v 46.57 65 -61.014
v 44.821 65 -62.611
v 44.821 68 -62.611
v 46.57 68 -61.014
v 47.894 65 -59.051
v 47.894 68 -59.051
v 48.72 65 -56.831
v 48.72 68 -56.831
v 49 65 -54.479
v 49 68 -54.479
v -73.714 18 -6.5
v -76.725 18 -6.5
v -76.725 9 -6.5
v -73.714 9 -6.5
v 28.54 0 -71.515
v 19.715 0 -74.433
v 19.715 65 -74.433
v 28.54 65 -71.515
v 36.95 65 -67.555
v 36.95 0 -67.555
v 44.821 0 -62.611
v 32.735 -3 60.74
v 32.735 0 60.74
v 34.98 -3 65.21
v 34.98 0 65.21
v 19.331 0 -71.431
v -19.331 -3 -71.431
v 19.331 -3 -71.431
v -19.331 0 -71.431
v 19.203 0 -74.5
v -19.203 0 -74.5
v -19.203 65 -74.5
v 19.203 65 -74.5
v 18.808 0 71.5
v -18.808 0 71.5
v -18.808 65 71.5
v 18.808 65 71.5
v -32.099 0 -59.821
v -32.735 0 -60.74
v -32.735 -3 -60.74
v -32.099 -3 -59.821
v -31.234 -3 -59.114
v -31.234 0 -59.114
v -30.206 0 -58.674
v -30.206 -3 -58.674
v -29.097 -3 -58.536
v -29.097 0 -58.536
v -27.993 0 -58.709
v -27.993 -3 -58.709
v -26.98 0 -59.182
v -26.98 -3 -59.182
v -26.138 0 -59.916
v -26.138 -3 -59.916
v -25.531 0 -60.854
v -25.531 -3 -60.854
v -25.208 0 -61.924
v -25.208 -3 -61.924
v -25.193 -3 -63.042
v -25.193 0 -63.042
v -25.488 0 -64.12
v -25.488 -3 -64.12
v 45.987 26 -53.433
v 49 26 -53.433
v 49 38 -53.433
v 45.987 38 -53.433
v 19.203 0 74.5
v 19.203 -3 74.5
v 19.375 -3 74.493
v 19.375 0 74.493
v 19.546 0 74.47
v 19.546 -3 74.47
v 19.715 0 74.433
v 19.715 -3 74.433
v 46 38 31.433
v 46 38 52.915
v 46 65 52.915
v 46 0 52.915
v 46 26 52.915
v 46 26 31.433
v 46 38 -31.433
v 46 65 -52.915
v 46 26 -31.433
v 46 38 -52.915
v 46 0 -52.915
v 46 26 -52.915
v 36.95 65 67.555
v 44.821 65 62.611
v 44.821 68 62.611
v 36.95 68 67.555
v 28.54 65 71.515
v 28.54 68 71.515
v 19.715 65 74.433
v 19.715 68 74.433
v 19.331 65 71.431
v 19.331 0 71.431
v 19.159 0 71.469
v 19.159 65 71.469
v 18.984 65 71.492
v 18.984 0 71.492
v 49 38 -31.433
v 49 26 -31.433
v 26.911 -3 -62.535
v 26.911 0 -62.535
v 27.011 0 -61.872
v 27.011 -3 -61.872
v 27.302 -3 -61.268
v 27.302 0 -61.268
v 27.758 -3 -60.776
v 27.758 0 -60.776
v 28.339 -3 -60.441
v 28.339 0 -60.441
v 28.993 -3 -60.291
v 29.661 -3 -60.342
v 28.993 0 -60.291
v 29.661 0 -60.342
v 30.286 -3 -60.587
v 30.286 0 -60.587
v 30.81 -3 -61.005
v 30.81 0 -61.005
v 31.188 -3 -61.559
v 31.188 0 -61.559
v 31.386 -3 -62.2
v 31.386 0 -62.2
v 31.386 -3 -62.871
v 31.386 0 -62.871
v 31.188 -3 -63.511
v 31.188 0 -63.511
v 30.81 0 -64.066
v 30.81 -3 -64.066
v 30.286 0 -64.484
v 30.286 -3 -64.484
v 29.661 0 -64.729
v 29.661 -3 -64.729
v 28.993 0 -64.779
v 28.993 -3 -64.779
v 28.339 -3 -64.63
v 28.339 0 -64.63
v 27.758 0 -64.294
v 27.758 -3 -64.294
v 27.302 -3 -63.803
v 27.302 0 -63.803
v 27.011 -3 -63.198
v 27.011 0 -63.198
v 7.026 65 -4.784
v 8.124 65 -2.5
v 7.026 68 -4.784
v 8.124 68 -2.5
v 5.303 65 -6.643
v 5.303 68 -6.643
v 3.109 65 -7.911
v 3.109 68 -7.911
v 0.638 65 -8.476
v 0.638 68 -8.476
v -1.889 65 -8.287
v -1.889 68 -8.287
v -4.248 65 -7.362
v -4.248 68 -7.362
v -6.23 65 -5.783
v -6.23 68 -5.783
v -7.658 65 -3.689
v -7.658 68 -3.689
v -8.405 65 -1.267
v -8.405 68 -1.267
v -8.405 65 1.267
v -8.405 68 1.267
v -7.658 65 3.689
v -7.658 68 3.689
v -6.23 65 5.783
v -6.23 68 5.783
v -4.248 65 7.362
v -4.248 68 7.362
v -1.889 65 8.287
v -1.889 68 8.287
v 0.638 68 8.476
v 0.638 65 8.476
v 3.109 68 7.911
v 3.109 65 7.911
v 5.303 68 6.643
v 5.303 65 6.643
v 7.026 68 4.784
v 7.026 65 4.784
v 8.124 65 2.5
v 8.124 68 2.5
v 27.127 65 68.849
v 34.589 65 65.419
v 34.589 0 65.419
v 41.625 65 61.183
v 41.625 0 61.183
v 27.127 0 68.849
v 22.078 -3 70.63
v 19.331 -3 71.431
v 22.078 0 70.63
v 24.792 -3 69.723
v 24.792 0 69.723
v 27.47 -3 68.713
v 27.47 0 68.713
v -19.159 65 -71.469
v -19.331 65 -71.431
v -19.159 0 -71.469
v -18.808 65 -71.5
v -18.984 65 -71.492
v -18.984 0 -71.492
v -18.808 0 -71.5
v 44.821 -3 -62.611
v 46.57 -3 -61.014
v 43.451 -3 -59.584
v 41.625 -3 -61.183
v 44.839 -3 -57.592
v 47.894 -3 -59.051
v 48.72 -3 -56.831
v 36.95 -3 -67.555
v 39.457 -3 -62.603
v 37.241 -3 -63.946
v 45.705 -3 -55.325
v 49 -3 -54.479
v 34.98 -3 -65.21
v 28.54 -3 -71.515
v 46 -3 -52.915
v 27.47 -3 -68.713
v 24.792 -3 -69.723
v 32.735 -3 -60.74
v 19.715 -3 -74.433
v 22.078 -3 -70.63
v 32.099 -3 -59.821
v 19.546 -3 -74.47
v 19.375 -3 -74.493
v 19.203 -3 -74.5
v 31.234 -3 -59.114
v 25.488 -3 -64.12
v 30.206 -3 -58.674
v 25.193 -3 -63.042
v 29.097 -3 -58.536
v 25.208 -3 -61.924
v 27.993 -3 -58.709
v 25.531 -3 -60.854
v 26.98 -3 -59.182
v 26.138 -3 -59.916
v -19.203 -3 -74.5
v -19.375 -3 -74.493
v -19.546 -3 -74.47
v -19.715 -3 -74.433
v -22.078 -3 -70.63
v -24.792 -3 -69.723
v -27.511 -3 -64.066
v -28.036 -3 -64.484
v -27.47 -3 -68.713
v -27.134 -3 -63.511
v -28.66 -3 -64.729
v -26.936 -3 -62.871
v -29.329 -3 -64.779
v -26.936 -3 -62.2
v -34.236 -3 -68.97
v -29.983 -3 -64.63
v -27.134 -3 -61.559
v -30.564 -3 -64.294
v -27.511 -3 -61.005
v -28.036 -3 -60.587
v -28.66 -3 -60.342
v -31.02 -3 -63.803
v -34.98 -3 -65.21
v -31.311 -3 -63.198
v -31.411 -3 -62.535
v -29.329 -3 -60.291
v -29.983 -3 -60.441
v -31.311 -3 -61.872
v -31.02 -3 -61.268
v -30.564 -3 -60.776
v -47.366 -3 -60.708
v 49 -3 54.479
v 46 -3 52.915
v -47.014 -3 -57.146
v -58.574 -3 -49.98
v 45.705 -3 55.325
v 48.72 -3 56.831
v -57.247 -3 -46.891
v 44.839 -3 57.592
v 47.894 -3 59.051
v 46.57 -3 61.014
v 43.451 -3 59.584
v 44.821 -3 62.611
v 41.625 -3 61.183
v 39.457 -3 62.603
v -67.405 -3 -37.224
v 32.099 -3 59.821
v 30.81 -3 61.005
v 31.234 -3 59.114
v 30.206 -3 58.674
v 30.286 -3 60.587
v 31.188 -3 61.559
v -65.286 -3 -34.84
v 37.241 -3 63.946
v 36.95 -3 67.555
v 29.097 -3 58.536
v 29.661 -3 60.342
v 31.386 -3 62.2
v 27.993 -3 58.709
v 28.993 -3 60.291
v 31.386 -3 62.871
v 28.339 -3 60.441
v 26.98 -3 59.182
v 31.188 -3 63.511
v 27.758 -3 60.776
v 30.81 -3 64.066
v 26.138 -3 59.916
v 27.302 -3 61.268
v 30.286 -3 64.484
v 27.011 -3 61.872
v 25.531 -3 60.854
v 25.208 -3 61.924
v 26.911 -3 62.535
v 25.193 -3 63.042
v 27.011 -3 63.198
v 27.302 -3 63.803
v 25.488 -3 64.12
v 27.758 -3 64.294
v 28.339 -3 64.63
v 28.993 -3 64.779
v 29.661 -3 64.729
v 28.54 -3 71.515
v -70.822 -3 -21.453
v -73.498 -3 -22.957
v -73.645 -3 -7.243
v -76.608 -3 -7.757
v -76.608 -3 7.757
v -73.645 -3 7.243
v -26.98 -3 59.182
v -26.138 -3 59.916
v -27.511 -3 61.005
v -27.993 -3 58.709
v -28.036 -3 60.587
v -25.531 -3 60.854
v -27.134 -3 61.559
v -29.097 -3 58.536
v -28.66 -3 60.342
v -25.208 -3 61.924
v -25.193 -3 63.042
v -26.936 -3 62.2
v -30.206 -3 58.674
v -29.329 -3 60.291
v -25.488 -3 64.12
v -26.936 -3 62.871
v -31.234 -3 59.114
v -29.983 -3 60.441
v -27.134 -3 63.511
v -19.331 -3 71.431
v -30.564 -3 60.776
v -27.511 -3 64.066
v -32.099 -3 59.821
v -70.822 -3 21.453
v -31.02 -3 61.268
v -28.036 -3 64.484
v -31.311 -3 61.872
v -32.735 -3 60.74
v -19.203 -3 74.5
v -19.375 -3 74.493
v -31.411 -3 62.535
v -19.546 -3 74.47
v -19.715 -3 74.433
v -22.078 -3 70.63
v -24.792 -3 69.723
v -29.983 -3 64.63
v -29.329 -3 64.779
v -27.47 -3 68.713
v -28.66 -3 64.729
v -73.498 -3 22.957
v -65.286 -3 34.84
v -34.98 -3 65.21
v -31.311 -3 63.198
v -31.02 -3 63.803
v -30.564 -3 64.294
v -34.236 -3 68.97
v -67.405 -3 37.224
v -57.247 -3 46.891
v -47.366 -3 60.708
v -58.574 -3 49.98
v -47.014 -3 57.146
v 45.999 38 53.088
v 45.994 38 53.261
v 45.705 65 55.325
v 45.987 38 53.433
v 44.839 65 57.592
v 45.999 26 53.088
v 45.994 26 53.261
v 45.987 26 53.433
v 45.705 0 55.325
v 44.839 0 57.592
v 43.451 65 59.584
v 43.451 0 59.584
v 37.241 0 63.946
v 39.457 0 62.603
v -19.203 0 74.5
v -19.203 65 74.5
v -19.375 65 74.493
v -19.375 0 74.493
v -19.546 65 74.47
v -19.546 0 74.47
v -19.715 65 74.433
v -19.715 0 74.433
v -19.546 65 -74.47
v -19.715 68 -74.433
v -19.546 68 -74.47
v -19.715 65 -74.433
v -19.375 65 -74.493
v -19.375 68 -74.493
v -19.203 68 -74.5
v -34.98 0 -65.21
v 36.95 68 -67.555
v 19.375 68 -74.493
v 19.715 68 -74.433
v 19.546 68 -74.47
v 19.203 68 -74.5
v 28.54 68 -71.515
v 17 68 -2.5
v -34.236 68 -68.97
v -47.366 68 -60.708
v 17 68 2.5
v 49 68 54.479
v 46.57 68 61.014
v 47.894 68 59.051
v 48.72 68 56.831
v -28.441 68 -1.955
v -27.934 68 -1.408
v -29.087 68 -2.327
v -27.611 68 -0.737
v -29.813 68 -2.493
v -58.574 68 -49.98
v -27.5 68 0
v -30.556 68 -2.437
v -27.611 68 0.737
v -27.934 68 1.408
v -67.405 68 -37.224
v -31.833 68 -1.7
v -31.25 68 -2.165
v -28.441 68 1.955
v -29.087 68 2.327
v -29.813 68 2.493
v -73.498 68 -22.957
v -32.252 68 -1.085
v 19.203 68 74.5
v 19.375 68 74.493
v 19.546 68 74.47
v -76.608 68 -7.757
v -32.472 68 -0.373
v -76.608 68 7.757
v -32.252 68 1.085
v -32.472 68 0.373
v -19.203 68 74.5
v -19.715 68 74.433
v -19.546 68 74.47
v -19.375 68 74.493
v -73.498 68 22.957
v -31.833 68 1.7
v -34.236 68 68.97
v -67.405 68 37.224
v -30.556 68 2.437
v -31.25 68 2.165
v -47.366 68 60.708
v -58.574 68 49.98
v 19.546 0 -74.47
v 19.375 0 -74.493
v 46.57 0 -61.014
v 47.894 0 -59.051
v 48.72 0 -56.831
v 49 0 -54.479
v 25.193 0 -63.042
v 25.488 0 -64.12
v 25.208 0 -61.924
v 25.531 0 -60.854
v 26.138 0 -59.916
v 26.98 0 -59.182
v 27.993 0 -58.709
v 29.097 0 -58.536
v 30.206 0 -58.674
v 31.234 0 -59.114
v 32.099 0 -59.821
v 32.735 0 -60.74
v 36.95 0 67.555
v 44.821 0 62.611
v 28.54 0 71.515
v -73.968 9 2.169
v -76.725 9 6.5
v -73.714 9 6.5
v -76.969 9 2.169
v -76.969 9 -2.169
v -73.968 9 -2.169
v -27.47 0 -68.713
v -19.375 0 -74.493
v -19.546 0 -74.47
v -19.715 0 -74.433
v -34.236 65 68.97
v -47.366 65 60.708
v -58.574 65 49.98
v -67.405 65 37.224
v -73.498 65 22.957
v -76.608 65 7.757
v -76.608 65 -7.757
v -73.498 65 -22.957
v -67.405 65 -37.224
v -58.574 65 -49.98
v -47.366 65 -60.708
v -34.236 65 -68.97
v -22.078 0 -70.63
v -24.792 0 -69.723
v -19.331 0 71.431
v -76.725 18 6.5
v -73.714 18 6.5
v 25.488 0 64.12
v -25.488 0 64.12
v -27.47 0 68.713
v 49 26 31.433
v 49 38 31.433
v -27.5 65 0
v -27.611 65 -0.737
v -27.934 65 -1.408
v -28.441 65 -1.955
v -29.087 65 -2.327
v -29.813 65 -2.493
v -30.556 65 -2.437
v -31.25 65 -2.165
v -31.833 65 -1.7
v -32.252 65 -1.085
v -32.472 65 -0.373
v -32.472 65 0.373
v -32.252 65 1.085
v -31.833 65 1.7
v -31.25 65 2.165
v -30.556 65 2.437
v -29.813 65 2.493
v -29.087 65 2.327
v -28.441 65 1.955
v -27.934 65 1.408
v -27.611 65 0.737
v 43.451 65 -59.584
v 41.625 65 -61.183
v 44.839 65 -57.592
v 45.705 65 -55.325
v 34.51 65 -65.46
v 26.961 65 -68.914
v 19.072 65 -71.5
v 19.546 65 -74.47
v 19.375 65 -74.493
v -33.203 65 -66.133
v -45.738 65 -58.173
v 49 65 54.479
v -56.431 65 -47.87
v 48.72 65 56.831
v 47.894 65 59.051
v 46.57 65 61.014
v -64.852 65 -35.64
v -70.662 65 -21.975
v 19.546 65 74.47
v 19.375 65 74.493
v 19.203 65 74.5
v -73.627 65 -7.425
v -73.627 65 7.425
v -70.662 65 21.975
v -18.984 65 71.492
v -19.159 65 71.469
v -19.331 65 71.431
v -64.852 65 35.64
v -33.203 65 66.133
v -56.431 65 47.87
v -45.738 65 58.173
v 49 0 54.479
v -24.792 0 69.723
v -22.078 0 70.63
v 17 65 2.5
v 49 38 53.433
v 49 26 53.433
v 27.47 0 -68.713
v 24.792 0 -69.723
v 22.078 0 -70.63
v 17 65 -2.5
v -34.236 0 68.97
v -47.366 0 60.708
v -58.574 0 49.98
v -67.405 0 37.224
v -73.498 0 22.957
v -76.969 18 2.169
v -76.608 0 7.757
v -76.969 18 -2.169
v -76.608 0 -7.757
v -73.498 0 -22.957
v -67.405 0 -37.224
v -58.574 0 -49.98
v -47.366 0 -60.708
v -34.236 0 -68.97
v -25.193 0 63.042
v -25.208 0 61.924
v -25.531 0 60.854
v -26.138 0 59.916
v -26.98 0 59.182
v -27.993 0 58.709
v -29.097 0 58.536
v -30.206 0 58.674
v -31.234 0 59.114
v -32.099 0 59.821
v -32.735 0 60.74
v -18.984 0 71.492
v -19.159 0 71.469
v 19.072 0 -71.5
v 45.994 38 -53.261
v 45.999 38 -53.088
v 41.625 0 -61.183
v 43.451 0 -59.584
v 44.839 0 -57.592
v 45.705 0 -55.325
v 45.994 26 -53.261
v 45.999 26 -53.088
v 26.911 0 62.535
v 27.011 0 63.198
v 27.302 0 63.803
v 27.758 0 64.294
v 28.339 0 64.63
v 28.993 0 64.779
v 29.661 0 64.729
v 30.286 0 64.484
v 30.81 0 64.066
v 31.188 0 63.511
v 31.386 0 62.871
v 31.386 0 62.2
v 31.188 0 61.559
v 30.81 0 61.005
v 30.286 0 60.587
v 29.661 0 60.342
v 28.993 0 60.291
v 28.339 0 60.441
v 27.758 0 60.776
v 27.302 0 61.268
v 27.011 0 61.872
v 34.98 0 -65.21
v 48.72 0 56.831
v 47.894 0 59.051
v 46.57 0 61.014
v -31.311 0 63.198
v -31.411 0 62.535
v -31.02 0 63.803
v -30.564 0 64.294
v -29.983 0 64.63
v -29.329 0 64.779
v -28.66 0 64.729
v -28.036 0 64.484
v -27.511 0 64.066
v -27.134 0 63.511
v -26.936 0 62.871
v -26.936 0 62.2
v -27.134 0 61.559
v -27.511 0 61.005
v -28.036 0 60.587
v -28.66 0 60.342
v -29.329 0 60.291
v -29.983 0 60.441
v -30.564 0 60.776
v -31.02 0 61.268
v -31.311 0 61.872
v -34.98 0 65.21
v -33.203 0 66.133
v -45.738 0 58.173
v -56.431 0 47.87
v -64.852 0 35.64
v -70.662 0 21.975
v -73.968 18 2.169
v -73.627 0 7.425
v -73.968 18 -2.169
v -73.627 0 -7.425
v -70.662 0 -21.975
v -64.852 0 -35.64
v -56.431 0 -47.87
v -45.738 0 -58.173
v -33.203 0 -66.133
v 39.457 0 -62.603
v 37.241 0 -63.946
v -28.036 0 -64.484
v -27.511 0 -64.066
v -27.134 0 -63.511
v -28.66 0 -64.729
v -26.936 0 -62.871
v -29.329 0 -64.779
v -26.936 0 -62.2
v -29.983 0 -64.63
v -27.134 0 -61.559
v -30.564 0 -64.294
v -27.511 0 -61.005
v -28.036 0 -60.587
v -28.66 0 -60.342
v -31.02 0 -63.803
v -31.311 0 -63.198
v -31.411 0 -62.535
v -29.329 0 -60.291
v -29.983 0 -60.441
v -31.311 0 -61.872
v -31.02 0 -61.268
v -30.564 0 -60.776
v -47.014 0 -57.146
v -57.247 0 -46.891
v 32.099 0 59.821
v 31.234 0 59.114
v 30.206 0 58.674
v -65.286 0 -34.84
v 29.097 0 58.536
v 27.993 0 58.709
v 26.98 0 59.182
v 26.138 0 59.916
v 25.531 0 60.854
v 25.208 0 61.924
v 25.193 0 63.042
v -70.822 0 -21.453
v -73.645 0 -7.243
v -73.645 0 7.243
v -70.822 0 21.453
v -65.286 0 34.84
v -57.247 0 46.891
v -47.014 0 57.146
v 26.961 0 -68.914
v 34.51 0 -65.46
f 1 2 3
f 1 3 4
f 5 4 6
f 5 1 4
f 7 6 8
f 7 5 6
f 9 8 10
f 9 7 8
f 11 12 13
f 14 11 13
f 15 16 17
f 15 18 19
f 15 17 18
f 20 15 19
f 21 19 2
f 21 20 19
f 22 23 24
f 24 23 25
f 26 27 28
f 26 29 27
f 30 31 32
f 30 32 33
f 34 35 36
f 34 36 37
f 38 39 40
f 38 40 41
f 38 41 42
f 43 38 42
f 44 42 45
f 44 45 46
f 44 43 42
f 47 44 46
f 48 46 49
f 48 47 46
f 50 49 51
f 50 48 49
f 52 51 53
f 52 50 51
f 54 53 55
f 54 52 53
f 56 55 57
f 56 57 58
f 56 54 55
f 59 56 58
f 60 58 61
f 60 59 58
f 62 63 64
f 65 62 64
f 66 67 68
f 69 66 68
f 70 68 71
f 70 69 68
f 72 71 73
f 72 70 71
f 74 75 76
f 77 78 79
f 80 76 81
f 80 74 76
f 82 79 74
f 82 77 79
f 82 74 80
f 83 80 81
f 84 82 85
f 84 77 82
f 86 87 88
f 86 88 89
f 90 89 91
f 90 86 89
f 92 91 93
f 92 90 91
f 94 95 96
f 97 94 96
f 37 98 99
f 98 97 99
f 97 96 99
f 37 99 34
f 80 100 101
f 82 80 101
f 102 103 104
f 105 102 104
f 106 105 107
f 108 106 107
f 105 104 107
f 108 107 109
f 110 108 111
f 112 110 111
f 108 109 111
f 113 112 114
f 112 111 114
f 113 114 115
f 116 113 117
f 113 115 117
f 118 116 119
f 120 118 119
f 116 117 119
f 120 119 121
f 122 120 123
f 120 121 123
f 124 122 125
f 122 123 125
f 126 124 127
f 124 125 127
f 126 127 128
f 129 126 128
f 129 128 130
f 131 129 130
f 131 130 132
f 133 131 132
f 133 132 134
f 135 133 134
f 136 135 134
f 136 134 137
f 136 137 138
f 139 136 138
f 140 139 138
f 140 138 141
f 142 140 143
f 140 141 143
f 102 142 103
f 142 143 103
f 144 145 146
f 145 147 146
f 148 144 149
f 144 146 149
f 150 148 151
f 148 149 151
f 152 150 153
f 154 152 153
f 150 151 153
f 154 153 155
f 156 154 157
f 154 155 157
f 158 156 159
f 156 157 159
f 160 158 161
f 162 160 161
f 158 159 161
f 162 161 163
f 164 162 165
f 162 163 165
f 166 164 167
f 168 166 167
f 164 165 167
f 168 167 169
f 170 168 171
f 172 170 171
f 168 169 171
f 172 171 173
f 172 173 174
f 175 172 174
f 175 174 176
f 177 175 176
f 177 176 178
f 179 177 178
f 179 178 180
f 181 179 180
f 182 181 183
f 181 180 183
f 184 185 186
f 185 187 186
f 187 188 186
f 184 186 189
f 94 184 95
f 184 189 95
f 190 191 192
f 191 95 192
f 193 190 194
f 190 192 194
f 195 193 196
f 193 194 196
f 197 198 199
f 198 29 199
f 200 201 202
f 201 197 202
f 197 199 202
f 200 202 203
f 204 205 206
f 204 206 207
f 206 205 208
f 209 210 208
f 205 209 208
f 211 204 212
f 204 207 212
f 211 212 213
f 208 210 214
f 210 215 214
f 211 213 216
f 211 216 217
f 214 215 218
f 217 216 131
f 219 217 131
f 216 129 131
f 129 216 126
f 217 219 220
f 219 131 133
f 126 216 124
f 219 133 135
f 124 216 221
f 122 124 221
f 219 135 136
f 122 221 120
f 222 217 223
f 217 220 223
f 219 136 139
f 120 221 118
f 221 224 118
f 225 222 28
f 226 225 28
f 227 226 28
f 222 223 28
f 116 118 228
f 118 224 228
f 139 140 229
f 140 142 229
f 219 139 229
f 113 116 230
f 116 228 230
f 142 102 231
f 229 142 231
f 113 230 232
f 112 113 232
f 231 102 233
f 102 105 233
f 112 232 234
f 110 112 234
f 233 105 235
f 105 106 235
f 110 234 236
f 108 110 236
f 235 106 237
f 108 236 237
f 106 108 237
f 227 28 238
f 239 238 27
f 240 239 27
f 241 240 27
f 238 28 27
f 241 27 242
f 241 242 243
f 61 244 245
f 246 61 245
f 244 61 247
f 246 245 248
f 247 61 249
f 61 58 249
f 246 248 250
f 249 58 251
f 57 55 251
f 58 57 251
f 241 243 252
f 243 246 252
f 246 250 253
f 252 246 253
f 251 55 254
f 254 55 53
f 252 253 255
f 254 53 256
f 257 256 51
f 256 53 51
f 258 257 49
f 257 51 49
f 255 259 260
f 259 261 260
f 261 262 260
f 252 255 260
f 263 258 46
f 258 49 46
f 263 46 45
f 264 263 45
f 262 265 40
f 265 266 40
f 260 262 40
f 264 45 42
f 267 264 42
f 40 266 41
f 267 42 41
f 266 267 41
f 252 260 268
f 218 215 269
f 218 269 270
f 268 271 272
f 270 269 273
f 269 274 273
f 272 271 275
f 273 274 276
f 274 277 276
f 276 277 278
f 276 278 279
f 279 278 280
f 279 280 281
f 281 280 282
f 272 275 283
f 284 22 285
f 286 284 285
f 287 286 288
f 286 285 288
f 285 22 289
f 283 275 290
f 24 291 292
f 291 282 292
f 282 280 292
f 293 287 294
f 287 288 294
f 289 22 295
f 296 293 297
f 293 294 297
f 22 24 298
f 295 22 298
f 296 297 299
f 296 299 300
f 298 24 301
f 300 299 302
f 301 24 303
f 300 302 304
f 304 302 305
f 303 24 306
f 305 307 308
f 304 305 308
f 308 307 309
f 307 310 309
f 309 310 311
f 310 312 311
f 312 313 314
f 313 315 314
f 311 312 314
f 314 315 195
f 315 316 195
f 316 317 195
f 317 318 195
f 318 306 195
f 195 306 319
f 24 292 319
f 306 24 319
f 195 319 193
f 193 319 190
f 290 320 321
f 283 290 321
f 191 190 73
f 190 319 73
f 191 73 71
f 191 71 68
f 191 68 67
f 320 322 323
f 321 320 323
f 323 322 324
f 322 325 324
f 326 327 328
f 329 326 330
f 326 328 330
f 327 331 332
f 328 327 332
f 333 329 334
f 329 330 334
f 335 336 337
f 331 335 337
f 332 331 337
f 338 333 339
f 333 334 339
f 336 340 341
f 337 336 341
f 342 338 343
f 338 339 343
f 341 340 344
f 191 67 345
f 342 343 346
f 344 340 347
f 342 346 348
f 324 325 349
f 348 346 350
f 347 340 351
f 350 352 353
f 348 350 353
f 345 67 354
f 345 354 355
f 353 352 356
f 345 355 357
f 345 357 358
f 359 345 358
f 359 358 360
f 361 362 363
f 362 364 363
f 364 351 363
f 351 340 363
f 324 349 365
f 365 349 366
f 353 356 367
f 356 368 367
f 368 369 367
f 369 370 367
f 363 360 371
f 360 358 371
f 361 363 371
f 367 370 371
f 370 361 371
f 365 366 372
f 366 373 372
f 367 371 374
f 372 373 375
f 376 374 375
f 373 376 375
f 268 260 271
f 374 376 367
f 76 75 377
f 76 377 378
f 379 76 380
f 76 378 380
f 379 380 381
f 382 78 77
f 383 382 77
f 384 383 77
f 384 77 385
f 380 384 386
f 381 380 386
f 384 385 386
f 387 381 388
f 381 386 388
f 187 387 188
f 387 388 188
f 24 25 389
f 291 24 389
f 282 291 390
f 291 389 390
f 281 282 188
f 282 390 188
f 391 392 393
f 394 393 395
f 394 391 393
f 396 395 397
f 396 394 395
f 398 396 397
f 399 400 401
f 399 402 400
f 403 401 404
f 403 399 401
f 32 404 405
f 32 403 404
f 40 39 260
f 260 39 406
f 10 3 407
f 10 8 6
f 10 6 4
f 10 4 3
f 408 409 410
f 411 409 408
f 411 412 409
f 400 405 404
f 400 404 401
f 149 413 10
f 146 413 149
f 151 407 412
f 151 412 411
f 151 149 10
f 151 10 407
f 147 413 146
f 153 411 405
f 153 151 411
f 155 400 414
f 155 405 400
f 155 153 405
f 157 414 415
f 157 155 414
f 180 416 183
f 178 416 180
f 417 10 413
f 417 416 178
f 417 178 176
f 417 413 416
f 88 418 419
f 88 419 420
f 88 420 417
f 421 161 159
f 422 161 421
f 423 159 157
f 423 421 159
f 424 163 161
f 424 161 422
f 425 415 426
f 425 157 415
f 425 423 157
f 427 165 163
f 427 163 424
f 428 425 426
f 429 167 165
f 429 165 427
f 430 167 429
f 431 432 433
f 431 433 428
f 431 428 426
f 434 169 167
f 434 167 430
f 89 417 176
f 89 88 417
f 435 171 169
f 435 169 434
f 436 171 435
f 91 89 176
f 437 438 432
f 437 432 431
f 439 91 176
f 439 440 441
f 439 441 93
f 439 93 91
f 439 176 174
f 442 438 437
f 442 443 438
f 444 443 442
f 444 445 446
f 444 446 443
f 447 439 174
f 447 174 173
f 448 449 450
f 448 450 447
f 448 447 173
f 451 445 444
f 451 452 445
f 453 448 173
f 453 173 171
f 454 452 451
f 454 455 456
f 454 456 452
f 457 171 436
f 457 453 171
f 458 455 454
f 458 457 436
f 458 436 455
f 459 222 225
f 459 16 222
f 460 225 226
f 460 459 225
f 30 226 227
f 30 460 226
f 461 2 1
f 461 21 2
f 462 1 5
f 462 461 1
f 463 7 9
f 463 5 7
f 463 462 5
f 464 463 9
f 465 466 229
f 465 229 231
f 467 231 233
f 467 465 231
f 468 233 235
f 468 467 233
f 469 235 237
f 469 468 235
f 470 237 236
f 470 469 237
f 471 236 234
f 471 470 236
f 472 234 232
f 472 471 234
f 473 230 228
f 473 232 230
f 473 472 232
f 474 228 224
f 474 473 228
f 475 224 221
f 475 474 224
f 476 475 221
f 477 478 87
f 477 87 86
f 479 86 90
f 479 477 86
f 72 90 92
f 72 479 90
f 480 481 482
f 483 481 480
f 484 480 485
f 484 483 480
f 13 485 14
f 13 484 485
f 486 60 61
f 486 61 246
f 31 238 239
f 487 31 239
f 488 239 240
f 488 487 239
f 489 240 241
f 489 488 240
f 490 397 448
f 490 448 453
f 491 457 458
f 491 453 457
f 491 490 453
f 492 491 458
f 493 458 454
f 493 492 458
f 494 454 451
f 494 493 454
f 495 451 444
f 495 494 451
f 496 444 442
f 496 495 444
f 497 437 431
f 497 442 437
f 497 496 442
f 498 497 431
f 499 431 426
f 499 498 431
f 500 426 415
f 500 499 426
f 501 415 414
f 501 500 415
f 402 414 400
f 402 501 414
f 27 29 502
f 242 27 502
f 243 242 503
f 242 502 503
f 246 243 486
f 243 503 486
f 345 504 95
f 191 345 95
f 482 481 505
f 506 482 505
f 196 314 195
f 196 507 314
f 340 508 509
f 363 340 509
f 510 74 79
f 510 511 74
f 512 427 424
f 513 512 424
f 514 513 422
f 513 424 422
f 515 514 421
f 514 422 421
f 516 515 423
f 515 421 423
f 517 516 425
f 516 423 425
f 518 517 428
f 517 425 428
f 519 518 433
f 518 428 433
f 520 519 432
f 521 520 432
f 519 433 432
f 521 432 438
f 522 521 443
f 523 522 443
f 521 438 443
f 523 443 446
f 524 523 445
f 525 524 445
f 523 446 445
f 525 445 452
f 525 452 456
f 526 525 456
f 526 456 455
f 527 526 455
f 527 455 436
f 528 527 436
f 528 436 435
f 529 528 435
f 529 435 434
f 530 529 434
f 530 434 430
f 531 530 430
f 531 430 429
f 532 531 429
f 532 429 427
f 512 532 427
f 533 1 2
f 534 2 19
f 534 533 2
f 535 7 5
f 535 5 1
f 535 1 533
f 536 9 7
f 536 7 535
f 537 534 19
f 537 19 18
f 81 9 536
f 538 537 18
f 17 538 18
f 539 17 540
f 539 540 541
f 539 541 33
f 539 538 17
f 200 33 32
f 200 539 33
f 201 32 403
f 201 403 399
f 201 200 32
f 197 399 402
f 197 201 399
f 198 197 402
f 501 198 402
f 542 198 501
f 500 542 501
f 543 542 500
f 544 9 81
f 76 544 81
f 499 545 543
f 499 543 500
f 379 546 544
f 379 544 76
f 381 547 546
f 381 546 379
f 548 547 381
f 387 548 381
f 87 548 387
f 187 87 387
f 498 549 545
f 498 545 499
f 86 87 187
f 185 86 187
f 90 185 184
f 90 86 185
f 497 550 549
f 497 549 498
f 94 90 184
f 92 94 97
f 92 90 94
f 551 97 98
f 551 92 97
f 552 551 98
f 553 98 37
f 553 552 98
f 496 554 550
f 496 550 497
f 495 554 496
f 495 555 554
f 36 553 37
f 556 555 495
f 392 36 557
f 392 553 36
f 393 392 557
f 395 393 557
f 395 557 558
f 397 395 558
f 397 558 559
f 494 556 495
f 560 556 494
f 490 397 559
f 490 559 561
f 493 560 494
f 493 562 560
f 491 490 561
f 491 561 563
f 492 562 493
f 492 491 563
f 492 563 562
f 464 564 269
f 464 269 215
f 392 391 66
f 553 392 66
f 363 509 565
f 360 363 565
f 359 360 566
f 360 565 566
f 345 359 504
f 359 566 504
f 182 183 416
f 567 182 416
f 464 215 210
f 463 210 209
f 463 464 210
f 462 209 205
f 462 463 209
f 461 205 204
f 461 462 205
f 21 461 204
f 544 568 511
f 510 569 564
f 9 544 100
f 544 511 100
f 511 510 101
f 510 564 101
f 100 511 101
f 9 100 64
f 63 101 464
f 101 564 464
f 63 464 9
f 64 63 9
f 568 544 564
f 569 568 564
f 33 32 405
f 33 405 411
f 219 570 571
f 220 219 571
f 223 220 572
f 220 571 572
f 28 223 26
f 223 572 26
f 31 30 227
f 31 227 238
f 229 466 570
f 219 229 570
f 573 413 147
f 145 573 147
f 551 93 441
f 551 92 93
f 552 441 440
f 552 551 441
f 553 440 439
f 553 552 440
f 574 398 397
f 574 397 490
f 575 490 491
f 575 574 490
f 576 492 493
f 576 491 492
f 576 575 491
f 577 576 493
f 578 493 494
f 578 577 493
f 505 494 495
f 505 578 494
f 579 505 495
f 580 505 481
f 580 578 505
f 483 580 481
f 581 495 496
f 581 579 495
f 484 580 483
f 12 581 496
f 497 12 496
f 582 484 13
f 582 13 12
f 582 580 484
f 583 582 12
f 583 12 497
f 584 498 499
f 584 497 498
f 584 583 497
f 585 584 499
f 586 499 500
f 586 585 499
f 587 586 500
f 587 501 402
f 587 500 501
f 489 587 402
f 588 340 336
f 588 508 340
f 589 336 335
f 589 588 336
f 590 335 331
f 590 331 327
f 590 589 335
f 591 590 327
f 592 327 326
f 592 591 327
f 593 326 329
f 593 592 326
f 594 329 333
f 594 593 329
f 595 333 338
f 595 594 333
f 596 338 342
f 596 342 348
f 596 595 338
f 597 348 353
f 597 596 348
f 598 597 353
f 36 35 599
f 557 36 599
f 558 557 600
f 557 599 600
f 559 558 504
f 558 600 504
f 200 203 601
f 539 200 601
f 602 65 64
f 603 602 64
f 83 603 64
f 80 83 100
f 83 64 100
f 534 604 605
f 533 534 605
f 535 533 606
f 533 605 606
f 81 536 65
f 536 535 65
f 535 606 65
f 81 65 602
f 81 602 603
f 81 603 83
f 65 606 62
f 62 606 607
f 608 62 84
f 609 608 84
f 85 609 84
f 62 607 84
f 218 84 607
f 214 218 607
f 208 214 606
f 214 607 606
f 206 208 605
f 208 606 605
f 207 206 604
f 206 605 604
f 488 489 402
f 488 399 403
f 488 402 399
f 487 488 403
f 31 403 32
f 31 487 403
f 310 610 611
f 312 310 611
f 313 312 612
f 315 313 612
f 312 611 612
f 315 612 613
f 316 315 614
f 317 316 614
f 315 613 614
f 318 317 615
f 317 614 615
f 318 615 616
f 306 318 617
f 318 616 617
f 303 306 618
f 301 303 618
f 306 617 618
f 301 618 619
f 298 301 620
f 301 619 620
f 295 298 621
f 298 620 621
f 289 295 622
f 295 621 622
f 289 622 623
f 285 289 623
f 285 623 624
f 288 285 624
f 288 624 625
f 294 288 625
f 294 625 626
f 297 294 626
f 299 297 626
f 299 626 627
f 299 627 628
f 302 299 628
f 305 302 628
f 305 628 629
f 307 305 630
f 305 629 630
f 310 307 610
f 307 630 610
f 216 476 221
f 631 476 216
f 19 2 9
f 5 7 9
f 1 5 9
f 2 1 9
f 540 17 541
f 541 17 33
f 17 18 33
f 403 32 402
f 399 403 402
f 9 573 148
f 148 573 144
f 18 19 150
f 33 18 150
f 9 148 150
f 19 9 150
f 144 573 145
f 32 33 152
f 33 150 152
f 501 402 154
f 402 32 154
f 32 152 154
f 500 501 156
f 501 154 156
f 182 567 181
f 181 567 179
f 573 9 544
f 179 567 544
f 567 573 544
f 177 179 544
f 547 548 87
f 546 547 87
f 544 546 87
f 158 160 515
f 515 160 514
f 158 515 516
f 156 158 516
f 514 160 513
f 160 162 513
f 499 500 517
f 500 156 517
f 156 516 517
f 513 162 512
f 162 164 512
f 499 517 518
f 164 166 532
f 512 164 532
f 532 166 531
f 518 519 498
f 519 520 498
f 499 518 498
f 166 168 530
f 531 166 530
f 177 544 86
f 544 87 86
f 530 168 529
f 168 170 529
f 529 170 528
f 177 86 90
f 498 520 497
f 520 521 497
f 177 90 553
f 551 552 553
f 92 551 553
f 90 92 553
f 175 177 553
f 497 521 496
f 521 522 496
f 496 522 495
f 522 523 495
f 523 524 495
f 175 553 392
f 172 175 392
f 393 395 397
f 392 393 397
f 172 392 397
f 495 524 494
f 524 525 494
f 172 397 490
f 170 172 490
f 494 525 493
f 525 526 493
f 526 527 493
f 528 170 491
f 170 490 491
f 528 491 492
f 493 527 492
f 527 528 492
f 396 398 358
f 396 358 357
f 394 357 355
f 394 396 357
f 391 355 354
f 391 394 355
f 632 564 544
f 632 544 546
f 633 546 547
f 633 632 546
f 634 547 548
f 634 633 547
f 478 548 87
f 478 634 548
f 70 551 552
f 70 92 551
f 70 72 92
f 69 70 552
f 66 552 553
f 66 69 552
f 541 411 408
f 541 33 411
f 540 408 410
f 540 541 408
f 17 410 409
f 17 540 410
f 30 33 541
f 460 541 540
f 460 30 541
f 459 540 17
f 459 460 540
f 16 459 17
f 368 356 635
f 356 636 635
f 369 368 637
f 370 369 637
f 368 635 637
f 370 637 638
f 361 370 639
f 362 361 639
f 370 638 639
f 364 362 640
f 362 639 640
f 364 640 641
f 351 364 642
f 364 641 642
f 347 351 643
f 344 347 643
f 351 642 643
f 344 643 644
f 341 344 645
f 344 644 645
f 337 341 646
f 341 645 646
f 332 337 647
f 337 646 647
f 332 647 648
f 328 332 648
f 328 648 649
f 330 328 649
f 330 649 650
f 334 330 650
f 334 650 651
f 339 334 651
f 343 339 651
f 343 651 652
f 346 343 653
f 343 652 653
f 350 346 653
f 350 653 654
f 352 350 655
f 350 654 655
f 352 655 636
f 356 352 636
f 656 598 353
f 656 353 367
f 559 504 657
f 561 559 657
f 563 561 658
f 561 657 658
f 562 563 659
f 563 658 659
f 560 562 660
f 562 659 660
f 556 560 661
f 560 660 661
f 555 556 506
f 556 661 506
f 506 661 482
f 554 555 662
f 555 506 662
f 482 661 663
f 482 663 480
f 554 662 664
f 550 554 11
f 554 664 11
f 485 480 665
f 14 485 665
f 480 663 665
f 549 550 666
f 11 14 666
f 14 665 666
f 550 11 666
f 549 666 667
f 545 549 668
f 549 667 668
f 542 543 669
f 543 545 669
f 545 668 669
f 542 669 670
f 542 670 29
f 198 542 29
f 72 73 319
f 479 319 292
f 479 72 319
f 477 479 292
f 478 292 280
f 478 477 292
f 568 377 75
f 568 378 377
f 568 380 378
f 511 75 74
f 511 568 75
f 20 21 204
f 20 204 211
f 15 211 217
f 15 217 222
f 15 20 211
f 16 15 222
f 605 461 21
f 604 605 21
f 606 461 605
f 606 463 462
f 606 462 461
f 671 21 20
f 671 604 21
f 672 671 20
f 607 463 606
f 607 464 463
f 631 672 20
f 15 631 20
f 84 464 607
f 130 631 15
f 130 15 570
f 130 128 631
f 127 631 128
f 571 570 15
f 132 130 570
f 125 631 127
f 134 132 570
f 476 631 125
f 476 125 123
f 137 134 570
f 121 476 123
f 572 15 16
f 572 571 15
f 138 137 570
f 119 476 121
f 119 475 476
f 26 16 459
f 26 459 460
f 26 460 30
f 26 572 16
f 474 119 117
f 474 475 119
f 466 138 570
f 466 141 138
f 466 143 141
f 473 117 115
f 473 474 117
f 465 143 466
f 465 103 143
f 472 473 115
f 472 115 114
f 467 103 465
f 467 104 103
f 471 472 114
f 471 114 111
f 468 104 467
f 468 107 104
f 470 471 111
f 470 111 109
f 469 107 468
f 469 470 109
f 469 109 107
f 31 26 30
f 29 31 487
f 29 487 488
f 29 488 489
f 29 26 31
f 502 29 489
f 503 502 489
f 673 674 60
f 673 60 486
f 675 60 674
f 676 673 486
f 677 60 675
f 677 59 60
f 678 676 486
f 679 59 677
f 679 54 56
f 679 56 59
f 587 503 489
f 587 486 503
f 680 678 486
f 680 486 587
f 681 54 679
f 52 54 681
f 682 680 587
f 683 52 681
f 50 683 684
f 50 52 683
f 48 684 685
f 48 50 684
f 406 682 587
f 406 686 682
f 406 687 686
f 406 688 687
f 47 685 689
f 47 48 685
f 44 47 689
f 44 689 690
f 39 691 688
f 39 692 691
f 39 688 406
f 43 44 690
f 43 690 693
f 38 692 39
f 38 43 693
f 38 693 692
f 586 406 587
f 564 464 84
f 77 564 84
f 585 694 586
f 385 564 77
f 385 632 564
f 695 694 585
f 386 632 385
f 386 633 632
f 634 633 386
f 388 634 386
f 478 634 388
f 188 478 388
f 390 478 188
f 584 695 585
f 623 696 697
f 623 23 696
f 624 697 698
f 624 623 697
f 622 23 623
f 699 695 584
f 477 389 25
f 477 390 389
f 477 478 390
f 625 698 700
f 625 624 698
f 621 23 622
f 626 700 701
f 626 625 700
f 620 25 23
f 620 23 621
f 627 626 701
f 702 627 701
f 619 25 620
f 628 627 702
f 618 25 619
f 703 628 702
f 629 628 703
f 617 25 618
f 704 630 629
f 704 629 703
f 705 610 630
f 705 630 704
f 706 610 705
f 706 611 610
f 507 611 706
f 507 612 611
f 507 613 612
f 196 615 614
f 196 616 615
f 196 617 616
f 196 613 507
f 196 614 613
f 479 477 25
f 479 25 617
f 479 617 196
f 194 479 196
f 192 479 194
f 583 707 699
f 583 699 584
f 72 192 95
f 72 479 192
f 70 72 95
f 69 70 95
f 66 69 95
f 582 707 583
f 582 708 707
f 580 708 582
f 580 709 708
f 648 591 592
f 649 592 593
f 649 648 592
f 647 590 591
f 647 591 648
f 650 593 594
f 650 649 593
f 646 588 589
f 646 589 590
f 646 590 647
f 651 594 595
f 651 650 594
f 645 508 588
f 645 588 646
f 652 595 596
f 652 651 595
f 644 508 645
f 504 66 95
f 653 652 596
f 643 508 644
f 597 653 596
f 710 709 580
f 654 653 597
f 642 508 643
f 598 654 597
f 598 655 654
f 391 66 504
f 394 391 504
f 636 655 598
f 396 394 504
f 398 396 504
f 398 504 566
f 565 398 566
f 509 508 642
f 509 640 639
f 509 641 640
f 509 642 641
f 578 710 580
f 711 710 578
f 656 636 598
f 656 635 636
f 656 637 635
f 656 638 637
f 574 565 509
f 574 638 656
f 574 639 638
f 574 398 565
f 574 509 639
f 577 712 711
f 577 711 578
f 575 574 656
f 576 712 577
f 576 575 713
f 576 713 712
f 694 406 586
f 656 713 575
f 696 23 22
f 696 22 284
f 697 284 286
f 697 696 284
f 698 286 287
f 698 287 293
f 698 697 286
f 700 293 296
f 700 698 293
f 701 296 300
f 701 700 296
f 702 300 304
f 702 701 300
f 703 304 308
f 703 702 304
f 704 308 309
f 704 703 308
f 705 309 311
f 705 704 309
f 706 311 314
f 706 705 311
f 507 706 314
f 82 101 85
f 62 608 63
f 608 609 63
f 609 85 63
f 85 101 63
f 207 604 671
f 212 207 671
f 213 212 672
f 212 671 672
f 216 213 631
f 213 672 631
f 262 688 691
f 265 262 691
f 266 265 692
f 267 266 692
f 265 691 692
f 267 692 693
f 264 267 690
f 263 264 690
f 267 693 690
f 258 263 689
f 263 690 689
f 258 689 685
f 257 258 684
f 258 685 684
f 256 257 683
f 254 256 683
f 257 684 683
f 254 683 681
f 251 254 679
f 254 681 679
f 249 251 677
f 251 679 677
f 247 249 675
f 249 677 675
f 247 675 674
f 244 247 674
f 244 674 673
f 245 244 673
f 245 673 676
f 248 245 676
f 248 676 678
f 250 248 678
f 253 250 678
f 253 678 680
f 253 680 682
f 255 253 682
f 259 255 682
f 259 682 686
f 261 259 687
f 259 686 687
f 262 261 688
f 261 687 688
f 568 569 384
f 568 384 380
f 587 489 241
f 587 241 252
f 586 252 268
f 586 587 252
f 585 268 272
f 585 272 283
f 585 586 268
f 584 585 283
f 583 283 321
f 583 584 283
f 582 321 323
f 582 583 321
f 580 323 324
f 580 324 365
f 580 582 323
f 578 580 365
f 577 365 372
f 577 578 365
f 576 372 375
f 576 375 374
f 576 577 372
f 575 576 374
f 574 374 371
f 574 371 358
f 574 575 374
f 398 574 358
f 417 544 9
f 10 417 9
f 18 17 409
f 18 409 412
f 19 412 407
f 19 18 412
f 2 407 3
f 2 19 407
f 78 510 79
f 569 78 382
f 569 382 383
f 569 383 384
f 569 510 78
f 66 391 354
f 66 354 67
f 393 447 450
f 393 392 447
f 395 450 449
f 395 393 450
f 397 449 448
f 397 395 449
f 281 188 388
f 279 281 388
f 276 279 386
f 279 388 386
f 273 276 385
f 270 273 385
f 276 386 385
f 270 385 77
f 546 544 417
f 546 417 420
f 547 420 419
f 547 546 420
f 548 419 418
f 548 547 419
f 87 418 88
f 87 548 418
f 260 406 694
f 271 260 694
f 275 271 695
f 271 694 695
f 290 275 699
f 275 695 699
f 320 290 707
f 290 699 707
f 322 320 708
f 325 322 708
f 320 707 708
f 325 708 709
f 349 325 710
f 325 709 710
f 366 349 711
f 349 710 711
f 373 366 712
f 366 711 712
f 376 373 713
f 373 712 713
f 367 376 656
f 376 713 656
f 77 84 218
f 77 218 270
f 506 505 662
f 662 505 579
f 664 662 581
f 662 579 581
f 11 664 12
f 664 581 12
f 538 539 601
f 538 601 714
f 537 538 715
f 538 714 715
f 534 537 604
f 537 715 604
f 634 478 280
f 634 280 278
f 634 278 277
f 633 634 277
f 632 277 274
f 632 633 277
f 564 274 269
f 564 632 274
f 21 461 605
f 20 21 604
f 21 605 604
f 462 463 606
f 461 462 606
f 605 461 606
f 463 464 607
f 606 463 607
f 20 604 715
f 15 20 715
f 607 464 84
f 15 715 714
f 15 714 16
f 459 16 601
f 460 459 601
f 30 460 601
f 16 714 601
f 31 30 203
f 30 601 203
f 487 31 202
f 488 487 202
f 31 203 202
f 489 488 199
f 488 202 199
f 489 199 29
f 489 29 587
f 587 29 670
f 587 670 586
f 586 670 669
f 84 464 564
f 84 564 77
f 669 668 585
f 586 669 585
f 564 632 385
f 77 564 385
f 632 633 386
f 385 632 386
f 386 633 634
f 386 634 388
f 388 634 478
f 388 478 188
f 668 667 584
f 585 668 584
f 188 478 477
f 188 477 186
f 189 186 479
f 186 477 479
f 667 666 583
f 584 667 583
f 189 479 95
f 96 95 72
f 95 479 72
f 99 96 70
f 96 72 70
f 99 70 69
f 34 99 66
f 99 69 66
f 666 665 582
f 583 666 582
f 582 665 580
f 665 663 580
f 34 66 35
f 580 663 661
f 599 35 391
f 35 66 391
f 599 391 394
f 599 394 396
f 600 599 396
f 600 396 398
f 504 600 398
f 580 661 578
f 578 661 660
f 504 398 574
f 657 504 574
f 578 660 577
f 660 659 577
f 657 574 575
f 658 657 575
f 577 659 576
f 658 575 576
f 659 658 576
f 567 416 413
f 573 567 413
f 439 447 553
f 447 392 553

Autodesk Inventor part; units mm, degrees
ref_plane "YZ Plane" through (0, 0, 0) normal (1, 0, 0) x (0, 1, 0)
ref_plane "XZ Plane" through (0, 0, 0) normal (0, 1, 0) x (-1, 0, 0)
sketch "Sketch1" plane through (0, 0, 0) normal (0, 1, 0) x (-1, 0, 0)
  line L0 (18.8082, 71.5) -> (-18.8082, 71.5)
  line L1 (0, 0) -> (-49, 0) construction
  line L2 (19.2029, 74.5) -> (-19.2029, 74.5)
  line L3 (18.8082, -71.5) -> (-19.0722, -71.5)
  line L4 (19.2029, -74.5) -> (-19.2029, -74.5)
  line L5 (0, 0) -> (0, 74.5) construction
  line L6 (-46, 52.915) -> (-46, -52.915)
  line L7 (-49, 54.4794) -> (-49, -54.4794)
  arc A0 (-41.625, -61.183) -> (-19.0722, -71.5) centre (0, 0) ccw
  arc A1 (-44.8209, -62.6106) -> (-19.7149, -74.4333) centre (0, 0) ccw
  arc A2 (19.7149, -74.4333) -> (19.7149, 74.4333) centre (0, 0) ccw
  arc A3 (-19.7149, 74.4333) -> (-44.8209, 62.6106) centre (0, 0) ccw
  arc A4 (19.3307, -71.4306) -> (19.3307, 71.4306) centre (0, 0) ccw
  arc A5 (-19.3307, 71.4306) -> (-41.625, 61.183) centre (0, 0) ccw
  arc A6 (-19.7149, -74.4333) -> (-19.2029, -74.5) centre (-19.2029, -72.5) ccw
  arc A7 (19.2029, -74.5) -> (19.7149, -74.4333) centre (19.2029, -72.5) ccw
  arc A8 (18.8082, -71.5) -> (19.3307, -71.4306) centre (18.8082, -69.5) ccw
  arc A9 (19.3307, 71.4306) -> (18.8082, 71.5) centre (18.8082, 69.5) ccw
  arc A10 (19.7149, 74.4333) -> (19.2029, 74.5) centre (19.2029, 72.5) ccw
  arc A11 (-18.8082, 71.5) -> (-19.3307, 71.4306) centre (-18.8082, 69.5) ccw
  arc A12 (-19.2029, 74.5) -> (-19.7149, 74.4333) centre (-19.2029, 72.5) ccw
  arc A13 (-41.625, 61.183) -> (-46, 52.915) centre (-36, 52.915) ccw
  arc A14 (-44.8209, 62.6106) -> (-49, 54.4794) centre (-39, 54.4794) ccw
  arc A15 (-49, -54.4794) -> (-44.8209, -62.6106) centre (-39, -54.4794) ccw
  arc A16 (-46, -52.915) -> (-41.625, -61.183) centre (-36, -52.915) ccw
  point P0 (-19.4615, 74.5)
  point P1 (19.0722, -71.5)
  point P2 (19.4615, -74.5)
  point P3 (-19.4615, -74.5)
  point P4 (-49, -59.397)
  point P5 (-46, 57.9655)
  point P6 (-46, -57.9655)
  point P7 (-49, 59.397)
  point P8 (19.4615, 74.5)
  point P9 (19.0722, 71.5)
  point P10 (-19.0722, 71.5)
  dimension "d2" = 71.5
  dimension "d4" = 3
  dimension "d6" = 46
  dimension "d7" = 3
  dimension "d8" = 2
  dimension "d9" = 10
  dimension "d10" = 74
  dimension "d11" = 77
  dimension "d12" = 74
  dimension "d13" = 77
extrude "Extrusion1" add sketch "Sketch1" along normal blind 65
sketch "Sketch2" plane through (49, 0, 54.4794) normal (1, 0, 0) x (0, 0, -1)
  line L0 (54.4794, 0) -> (54.4794, 65) construction
  line L1 (107.3944, 65) -> (1.5643, 65) projected
  line L2 (1.046, 38) -> (23.046, 38)
  line L3 (23.046, 38) -> (23.046, 26)
  line L4 (23.046, 26) -> (1.046, 26)
  line L5 (0, 0) -> (108.9587, 0) projected
  line L6 (-19.954, 0) -> (-19.954, 65) projected
  line L7 (23.046, 26) -> (1.046, 26)
  line L8 (1.046, 26) -> (1.046, 38)
  line L9 (107.9127, 38) -> (85.9127, 38)
  line L10 (85.9127, 38) -> (85.9127, 26)
  line L11 (85.9127, 26) -> (107.9127, 26)
  line L12 (107.9127, 26) -> (107.9127, 38)
  point P0 (1.046, 32)
  dimension "d16" = 26
  dimension "d235" = 22
  dimension "d236" = 12
  dimension "d237" = 21
extrude "Extrusion2" cut sketch "Sketch2" against normal blind 13.25
sketch "Sketch3" plane through (49, 0, 54.4794) normal (1, 0, 0) x (0, 0, -1)
  line L0 (3.568, 49.2223) -> (17.7975, 43.9952) construction
  line L1 (2.8909, 47.379) -> (17.1204, 42.1519)
  line L2 (18.4746, 45.8385) -> (4.2452, 51.0656)
  arc A0 (4.2452, 51.0656) -> (2.8909, 47.379) centre (3.568, 49.2223) ccw
  arc A1 (17.1204, 42.1519) -> (18.4746, 45.8385) centre (17.7975, 43.9952) ccw
  arc A2 (44.4296, 11.624) -> (34.6921, 2.9774) centre (43.8866, 2.4292) ccw construction
  arc A3 (44.531, 13.3402) -> (32.9759, 3.0797) centre (43.8866, 2.4292) ccw
  arc A4 (44.3283, 9.9077) -> (36.4083, 2.8751) centre (43.8866, 2.4292) ccw
  arc A5 (44.3283, 9.9077) -> (44.531, 13.3402) centre (44.4296, 11.624) ccw
  arc A6 (32.9759, 3.0797) -> (36.4083, 2.8751) centre (34.6921, 2.9774) ccw
  line L3 (54.4794, 0) -> (54.4794, 65) construction
  line L4 (106.0678, 47.379) -> (91.8383, 42.1519)
  line L5 (90.4841, 45.8385) -> (104.7135, 51.0656)
  arc A7 (106.0678, 47.379) -> (104.7135, 51.0656) centre (105.3907, 49.2223) ccw
  arc A8 (90.4841, 45.8385) -> (91.8383, 42.1519) centre (91.1612, 43.9952) ccw
  point P0 (10.6828, 46.6088)
extrude "Extrusion3" [suppressed]
extrude "Extrusion4" add sketch "Sketch1" along normal blind 3 from surface at 65 separate body contours A9 A4 A8 L3 A0 A16 L6 A13 A5 A11 L0 | A10 A2 A7 L4 A6 A1 A15 L7 A14 A3 A12 L2
sketch "Sketch5" plane through (-19.2029, 68, 74.5) normal (0, 1, 0) x (1, 0, 0)
  circle A0 centre (19.2029, 74.5) radius 8.5
  circle A1 centre (-10.7971, 74.5) radius 2.5
  line L0 (27.3269, 72) -> (36.2029, 72)
  line L1 (36.2029, 72) -> (36.2029, 77)
  line L2 (36.2029, 77) -> (27.3269, 77)
  line L3 (36.2029, 74.5) -> (68.2029, 74.5)
  line L4 (68.2029, 20.0206) -> (68.2029, 128.9794) projected
  line L5 (-10.7971, 74.5) -> (-57.7971, 74.5)
  arc A2 (-0.5121, 148.9333) -> (-0.5121, 0.0667) centre (19.2029, 74.5) ccw projected
  dimension "d26" = 17
  dimension "d27" = 5
  dimension "d31" = 5
  dimension "d32" = 17
  dimension "d47" = 30
  dimension "d204" = 32
  dimension "d205" = 47
  dimension "d206" = 49
extrude "Extrusion5" cut sketch "Sketch5" against normal through all
sketch "Sketch6" plane through (0, 0, 0) normal (0, 1, 0) x (-1, 0, 0)
  circle A0 centre (0, 0) radius 69 construction
  arc A1 (-19.3307, 71.4306) -> (-41.625, 61.183) centre (0, 0) ccw projected
  arc A2 (-41.625, 61.183) -> (-46, 52.915) centre (-36, 52.915) ccw projected
  line L0 (-46, -52.915) -> (-46, 52.915) projected
  arc A3 (-46, -52.915) -> (-41.625, -61.183) centre (-36, -52.915) ccw projected
  arc A4 (-41.625, -61.183) -> (-19.0722, -71.5) centre (0, 0) ccw projected
  line L1 (18.8082, -71.5) -> (-19.0722, -71.5) construction
  arc A5 (19.3307, -71.4306) -> (19.3307, 71.4306) centre (0, 0) ccw projected
  line L2 (-18.8082, 71.5) -> (18.8082, 71.5) construction
  line L3 (19.2029, 74.5) -> (-19.2029, 74.5) projected
  arc A6 (-19.7149, 74.4333) -> (-44.8209, 62.6106) centre (0, 0) ccw projected
  arc A7 (-44.8209, 62.6106) -> (-49, 54.4794) centre (-39, 54.4794) ccw projected
  line L4 (-49, 54.4794) -> (-49, -54.4794) projected
  arc A8 (-49, -54.4794) -> (-44.8209, -62.6106) centre (-39, -54.4794) ccw projected
  arc A9 (-44.8209, -62.6106) -> (-19.7149, -74.4333) centre (0, 0) ccw projected
  line L5 (-19.2029, -74.5) -> (19.2029, -74.5) projected
  arc A10 (19.7149, -74.4333) -> (19.7149, 74.4333) centre (0, 0) ccw projected
  arc A11 (-18.5383, 65.4242) -> (-38.25, 56.2222) centre (0, 0) ccw construction
  arc A12 (-38.25, 56.2222) -> (-40, 52.915) centre (-36, 52.915) ccw construction
  line L6 (-40, 52.915) -> (-40, -52.915) construction
  arc A13 (-40, -52.915) -> (-38.25, -56.2222) centre (-36, -52.915) ccw construction
  arc A14 (-38.25, -56.2222) -> (-18.5383, -65.4242) centre (0, 0) ccw construction
  line L7 (-17.9931, -65.5) -> (17.9931, -65.5) construction
  line L8 (-17.9931, 65.5) -> (17.9931, 65.5) construction
  arc A15 (18.5383, -65.4242) -> (18.5383, 65.4242) centre (0, 0) ccw construction
  arc A16 (-8.124, -2.5) -> (-8.124, 2.5) centre (0, 0) ccw projected
  line L9 (0, 0) -> (52.8571, 44.3523) construction
  line L10 (0, 0) -> (77, 0) construction
  line L11 (0, 0) -> (0, -69) construction
  circle A17 centre (29.1607, 62.5352) radius 3 construction
  line L12 (29.1607, 62.5352) -> (0, 0) construction
  circle A18 centre (-29.1607, 62.5352) radius 3 construction
  line L13 (-29.1607, 62.5352) -> (0, 0) construction
  arc A19 (-17.9931, 65.5) -> (-18.5383, 65.4242) centre (-17.9931, 63.5) ccw construction
  arc A20 (-18.5383, -65.4242) -> (-17.9931, -65.5) centre (-17.9931, -63.5) ccw construction
  arc A21 (17.9931, -65.5) -> (18.5383, -65.4242) centre (17.9931, -63.5) ccw construction
  arc A22 (18.5383, 65.4242) -> (17.9931, 65.5) centre (17.9931, 63.5) ccw construction
  arc A23 (-19.7149, -74.4333) -> (-19.2029, -74.5) centre (-19.2029, -72.5) ccw projected
  arc A24 (19.2029, -74.5) -> (19.7149, -74.4333) centre (19.2029, -72.5) ccw projected
  arc A25 (19.7149, 74.4333) -> (19.2029, 74.5) centre (19.2029, 72.5) ccw projected
  arc A26 (-19.2029, 74.5) -> (-19.7149, 74.4333) centre (-19.2029, 72.5) ccw projected
  circle A27 centre (29.1607, -62.5352) radius 3 construction
  circle A28 centre (-29.1607, -62.5352) radius 3 construction
  line L14 (19.3307, 65.1945) -> (19.3307, 71.4306)
  line L15 (-19.3307, 65.1945) -> (-19.3307, 71.4306)
  line L16 (19.3307, 71.4306) -> (-19.3307, 71.4306)
  line L17 (19.3307, -65.1945) -> (19.3307, -71.4306)
  line L18 (-19.3307, -65.1945) -> (-19.3307, -71.4306)
  line L19 (19.3307, -71.4306) -> (-19.3307, -71.4306)
  circle A29 centre (29.1607, 62.5352) radius 4
  circle A30 centre (-29.1607, 62.5352) radius 4
  line L20 (-32.7354, 60.7404) -> (-34.9798, 65.2105)
  circle A31 centre (29.1607, -62.5352) radius 4
  circle A32 centre (-29.1607, -62.5352) radius 4
  line L21 (-32.7354, -60.7404) -> (-34.9798, -65.2105)
  line L22 (32.7354, 60.7404) -> (34.9798, 65.2105)
  line L23 (32.7354, -60.7404) -> (34.9798, -65.2105)
  line L24 (-25.488, 64.1199) -> (-27.4696, 68.7126)
  line L25 (25.488, 64.1199) -> (27.4696, 68.7126)
  line L26 (-25.488, -64.1199) -> (-27.4696, -68.7126)
  line L27 (25.488, -64.1199) -> (27.4696, -68.7126)
  line L28 (-18.8082, 71.5) -> (-49, 71.5)
  line L29 (-49, 71.5) -> (-49, 54.4794)
  line L30 (-28.5788, 71.5) -> (-18.8082, 71.5)
  circle A33 centre (-29.1607, -62.5352) radius 2.25
  circle A34 centre (29.1607, -62.5352) radius 2.25
  circle A35 centre (29.1607, 62.5352) radius 2.25
  circle A36 centre (-29.1607, 62.5352) radius 2.25
  point P0 (-18.2688, -65.5)
  point P1 (-19.3307, 65.1945)
  point P2 (-19.3307, -65.1945)
  point P3 (29.1607, 62.5352)
  point P4 (26.7032, 60.8145)
  point P5 (-46, 24)
  point P6 (-46, 16)
  point P7 (-29.4221, 59.5467)
  point P8 (-19.3307, -71.4306)
  point P9 (-34.9798, -65.2105)
  point P10 (34.9798, -65.2105)
  point P11 (-27.9581, 66.3502)
  point P12 (-27.9581, -66.3502)
  point P13 (27.9581, -66.3502)
  point P14 (27.9581, 66.3502)
  point P15 (-32.8561, 64.0662)
  point P16 (32.8561, -64.0662)
  point P17 (-32.8561, -64.0662)
  point P18 (32.8561, 64.0662)
  point P19 (25.488, -64.1199)
  point P20 (27.4696, -68.7126)
  point P21 (-25.488, -64.1199)
  point P22 (34.0084, -67.0387)
  point P23 (-28.5882, -71.3052)
  point P24 (28.5882, -71.3052)
  point P25 (28.5882, 71.3052)
  point P26 (-28.5882, 71.3052)
  point P27 (34.0084, 67.0387)
  point P28 (-19.3307, -71.4306)
  point P29 (-34.0084, -67.0387)
  point P30 (-34.0084, 67.0387)
  dimension "d33" = 138
  dimension "d229" = 6
  dimension "d34" = 6
  dimension "d35" = 6
  dimension "d36" = 6
  dimension "d37" = 40
  dimension "d38" = 25
  dimension "d42" = 25
  dimension "d44" = 2
  dimension "d62" = 8
  dimension "d64" = 8
  dimension "d171" = 90
  dimension "d172" = 17.0206
  dimension "d227" = 4.5
  dimension "d228" = 4.5
  dimension "d230" = 4.5
  dimension "d231" = 4.5
extrude "Extrusion6" add sketch "Sketch6" against normal blind 3 separate body contours L24 A30 L20 A1 | A30 | A5 L22 A29 L25 | A29 | A5 L27 A31 L23 | A31 | L21 A32 L26 A4 | A32 | A25 A10 A24 L5 A23 A9 A8 L4 A7 A6 A26 L3
ref_plane "Work Plane2" through (-77, 0, 0) normal (-1, 0, 0) x (0, 0, 1)
sketch "Sketch20" plane through (-77, 0, 0) normal (-1, 0, 0) x (0, 0, 1)
  line L0 (-54.4794, -3) -> (54.4794, -3) projected
  line L1 (0, -3) -> (0, 9)
  line L2 (0, 9) -> (0, 18)
  line L3 (0, 18) -> (6.5, 18)
  line L4 (0, 9) -> (-6.5, 9)
  line L5 (-6.5, 9) -> (6.5, 9)
  line L6 (6.5, 9) -> (6.5, 18)
  line L7 (6.5, 18) -> (-6.5, 18)
  line L8 (-6.5, 18) -> (-6.5, 9)
  point P0 (0, 0)
  dimension "d215" = 12
  dimension "d216" = 9
  dimension "d217" = 6.5
  dimension "d218" = 6.5
extrude "Extrusion16" cut sketch "Sketch20" against normal blind 10.75 bodies 1
properties part number "carcasa4.0"
